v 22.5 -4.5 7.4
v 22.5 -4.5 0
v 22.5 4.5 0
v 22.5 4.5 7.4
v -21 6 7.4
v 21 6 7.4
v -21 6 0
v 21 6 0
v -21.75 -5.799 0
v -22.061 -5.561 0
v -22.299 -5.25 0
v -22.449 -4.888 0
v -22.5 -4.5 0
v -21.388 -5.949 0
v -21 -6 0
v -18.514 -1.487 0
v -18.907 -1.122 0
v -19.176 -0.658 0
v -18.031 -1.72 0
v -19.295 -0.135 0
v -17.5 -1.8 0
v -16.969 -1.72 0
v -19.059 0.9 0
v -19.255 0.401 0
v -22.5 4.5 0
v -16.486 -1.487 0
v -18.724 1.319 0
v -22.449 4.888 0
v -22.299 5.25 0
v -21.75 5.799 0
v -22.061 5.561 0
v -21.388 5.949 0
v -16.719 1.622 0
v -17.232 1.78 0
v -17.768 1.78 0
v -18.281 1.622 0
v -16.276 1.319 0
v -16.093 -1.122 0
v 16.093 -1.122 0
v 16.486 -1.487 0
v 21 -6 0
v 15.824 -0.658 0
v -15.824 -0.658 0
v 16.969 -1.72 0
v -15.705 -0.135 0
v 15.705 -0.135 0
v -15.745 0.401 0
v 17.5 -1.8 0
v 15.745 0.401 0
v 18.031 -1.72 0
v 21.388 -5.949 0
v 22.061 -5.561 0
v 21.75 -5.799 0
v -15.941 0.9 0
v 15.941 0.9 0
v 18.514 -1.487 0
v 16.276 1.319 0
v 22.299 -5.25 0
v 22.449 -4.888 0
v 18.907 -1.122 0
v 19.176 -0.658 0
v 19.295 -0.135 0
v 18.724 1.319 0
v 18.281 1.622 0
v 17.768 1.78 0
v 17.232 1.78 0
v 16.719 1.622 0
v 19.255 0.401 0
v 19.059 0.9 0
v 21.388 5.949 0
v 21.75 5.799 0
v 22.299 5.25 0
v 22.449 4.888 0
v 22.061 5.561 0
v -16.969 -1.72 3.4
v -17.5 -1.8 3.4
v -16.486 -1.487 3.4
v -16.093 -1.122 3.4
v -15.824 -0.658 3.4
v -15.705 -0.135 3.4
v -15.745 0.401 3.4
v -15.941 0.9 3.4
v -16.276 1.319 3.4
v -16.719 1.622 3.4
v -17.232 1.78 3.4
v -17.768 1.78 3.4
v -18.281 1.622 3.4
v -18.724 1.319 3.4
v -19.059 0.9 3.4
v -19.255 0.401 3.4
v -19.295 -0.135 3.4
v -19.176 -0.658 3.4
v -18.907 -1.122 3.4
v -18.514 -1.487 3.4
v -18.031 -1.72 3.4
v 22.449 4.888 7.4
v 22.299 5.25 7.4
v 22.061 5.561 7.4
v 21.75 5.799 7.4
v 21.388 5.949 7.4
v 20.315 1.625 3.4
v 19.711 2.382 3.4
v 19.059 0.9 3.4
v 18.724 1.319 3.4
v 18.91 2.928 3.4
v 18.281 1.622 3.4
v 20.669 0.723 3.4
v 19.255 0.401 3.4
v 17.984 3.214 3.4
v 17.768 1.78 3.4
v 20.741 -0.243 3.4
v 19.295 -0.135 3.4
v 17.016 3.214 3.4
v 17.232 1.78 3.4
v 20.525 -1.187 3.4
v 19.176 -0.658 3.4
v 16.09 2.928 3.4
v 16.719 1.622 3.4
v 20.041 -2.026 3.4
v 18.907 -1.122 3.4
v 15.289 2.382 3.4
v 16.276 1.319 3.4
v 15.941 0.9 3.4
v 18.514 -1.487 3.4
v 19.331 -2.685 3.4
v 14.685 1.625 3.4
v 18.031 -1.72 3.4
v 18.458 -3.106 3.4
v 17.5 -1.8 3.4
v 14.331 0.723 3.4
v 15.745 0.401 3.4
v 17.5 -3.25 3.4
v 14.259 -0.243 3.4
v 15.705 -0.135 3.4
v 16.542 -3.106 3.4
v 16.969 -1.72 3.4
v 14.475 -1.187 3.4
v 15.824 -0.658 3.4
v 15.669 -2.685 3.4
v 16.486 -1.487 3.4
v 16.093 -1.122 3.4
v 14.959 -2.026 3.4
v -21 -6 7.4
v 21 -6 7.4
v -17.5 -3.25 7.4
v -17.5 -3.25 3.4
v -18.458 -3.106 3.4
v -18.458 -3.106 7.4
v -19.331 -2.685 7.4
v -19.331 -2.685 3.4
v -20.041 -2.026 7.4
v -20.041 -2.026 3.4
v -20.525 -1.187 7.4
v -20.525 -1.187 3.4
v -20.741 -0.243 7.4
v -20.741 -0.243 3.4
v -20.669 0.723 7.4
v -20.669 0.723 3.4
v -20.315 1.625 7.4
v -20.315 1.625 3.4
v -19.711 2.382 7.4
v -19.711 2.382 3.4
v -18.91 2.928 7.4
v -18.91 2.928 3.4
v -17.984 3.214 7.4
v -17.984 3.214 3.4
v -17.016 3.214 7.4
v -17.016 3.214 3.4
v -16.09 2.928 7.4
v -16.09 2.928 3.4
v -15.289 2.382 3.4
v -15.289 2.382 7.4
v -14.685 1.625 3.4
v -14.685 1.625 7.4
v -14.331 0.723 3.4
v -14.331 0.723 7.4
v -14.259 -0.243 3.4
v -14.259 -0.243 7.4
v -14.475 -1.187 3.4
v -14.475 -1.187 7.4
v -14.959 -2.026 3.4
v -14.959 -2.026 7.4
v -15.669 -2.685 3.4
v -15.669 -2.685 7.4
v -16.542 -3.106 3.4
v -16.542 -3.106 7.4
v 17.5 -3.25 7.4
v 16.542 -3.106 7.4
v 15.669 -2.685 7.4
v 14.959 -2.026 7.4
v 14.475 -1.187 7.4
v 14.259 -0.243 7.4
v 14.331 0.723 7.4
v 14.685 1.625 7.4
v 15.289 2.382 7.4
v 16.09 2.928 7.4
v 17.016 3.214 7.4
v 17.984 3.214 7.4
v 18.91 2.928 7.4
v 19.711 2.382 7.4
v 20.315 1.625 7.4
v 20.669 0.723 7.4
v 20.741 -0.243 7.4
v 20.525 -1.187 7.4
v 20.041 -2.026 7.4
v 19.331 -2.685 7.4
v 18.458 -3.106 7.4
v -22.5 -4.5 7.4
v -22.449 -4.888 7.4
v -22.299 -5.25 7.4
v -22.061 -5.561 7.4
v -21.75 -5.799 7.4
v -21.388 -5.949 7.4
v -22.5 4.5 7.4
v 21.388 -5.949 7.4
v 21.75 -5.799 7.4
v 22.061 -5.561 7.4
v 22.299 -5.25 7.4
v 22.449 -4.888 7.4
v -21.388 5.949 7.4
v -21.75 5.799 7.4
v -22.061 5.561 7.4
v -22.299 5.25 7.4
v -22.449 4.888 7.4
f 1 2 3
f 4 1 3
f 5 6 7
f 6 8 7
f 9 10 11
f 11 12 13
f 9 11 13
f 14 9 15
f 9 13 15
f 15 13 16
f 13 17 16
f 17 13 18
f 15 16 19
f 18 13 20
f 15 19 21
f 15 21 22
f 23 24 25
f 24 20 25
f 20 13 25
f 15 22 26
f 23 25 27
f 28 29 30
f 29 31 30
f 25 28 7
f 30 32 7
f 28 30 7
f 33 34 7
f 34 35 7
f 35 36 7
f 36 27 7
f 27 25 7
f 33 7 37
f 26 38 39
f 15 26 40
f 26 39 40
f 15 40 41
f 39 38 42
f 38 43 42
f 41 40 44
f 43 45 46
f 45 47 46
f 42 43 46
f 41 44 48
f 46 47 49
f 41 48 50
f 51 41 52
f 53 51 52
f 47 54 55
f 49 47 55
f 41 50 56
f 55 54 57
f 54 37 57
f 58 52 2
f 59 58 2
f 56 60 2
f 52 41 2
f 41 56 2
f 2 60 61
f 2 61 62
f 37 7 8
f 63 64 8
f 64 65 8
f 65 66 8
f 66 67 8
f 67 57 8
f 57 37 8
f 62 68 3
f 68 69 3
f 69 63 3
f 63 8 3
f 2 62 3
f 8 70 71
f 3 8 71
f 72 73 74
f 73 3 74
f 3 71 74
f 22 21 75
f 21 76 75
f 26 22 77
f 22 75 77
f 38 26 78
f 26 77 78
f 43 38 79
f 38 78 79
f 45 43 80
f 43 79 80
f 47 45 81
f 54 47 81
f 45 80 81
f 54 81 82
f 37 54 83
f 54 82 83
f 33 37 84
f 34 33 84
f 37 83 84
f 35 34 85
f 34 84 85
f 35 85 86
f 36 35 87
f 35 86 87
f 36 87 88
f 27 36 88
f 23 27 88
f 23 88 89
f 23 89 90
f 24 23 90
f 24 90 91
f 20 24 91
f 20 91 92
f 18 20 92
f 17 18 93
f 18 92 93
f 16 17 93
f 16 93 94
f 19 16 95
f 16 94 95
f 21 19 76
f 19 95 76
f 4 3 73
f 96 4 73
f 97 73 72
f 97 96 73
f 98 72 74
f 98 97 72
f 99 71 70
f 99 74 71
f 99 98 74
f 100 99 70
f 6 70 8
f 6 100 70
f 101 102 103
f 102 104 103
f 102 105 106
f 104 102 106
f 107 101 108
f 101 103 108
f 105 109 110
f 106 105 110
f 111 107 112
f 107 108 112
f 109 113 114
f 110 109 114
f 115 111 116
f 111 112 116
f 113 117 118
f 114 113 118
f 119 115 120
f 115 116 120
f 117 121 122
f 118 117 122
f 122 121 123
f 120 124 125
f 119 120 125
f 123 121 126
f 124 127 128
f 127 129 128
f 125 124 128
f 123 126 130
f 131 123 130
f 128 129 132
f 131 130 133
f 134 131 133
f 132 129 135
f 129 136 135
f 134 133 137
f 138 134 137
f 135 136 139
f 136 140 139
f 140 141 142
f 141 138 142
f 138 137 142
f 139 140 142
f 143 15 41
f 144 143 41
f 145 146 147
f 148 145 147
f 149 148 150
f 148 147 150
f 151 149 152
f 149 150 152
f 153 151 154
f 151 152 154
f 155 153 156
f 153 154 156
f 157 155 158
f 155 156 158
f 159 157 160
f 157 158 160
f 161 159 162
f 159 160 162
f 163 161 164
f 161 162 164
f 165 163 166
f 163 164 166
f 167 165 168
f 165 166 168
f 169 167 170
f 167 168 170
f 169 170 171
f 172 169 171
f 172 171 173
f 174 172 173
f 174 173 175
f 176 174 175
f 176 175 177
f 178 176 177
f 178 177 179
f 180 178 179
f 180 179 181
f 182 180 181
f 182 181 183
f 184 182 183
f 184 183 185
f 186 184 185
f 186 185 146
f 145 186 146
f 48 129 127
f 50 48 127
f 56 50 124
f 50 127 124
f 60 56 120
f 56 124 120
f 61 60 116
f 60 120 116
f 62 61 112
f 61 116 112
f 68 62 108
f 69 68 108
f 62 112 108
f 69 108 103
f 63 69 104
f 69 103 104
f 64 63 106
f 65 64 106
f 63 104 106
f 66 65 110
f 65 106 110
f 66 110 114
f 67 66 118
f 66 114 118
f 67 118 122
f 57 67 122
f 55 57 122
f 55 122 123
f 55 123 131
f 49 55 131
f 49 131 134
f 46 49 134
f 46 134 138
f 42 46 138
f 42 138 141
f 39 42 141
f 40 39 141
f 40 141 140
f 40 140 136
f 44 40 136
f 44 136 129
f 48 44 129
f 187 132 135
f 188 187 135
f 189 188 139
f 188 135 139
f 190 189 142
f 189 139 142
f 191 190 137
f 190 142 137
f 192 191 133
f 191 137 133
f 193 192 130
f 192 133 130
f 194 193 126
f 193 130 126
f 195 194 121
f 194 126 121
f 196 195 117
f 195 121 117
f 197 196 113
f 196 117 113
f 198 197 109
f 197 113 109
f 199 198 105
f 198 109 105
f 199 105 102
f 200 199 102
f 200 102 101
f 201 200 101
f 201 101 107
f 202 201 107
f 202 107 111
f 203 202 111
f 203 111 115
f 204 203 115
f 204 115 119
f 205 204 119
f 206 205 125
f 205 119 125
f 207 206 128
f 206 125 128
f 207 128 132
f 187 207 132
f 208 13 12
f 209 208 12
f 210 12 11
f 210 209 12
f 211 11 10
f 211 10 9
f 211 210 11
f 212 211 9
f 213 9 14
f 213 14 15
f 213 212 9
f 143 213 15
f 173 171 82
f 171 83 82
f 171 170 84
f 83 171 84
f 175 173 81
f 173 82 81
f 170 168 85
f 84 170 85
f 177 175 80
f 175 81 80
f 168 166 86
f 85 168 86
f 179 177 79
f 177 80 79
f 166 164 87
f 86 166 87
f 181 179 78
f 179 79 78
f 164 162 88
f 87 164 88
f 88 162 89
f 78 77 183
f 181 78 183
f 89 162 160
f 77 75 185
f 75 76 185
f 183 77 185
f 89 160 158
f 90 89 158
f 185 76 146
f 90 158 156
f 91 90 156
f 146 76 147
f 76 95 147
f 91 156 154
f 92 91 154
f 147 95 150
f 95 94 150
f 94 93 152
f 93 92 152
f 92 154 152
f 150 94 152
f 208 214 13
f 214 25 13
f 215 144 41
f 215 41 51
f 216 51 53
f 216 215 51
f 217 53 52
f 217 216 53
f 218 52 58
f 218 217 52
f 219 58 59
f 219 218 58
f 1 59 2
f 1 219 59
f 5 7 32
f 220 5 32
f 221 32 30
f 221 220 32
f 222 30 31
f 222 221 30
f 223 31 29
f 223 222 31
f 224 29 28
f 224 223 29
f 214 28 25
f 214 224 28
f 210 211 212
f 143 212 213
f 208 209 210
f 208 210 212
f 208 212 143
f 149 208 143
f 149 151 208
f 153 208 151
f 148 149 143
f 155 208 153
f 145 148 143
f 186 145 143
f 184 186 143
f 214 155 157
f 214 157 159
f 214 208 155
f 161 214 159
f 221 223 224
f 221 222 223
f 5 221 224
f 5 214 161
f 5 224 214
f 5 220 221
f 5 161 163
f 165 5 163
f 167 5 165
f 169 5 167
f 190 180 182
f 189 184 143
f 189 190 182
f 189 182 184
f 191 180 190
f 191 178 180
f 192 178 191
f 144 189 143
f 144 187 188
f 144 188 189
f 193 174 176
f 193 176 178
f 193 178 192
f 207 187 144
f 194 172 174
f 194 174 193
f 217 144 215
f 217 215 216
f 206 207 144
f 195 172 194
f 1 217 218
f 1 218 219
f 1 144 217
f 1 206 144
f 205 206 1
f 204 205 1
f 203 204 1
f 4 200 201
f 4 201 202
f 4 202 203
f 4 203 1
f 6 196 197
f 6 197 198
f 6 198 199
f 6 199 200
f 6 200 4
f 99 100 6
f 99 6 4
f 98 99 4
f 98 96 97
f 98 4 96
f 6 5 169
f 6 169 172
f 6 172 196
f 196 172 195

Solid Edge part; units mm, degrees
sketch "Sketch1" plane through (0, 0, 0) normal (0, 0, 1) x (1, 0, 0)
  line L0 (-22.5, 6) -> (-22.5, -6)
  line L1 (-22.5, -6) -> (22.5, -6)
  line L2 (22.5, -6) -> (22.5, 6)
  line L3 (22.5, 6) -> (-22.5, 6)
extrude "Protrusion1" add sketch "Sketch1" along normal blind 7.4
hole "Hole_1" at (17.5, 0, 7.4) direction (0, 0, -1) diameter 3.6 end through all counterbore diameter 6.5 counterbore depth 4
hole "Hole1" at (-17.5, 0, 7.4) direction (0, 0, -1) diameter 3.6 end through all counterbore diameter 6.5 counterbore depth 4
fillet "Round_1" radius 1.5 4 edges at (-22.5, -6, 3.7) (22.5, -6, 3.7) (22.5, 6, 3.7) (-22.5, 6, 3.7)
properties material "Acrylic, high impact grade"
